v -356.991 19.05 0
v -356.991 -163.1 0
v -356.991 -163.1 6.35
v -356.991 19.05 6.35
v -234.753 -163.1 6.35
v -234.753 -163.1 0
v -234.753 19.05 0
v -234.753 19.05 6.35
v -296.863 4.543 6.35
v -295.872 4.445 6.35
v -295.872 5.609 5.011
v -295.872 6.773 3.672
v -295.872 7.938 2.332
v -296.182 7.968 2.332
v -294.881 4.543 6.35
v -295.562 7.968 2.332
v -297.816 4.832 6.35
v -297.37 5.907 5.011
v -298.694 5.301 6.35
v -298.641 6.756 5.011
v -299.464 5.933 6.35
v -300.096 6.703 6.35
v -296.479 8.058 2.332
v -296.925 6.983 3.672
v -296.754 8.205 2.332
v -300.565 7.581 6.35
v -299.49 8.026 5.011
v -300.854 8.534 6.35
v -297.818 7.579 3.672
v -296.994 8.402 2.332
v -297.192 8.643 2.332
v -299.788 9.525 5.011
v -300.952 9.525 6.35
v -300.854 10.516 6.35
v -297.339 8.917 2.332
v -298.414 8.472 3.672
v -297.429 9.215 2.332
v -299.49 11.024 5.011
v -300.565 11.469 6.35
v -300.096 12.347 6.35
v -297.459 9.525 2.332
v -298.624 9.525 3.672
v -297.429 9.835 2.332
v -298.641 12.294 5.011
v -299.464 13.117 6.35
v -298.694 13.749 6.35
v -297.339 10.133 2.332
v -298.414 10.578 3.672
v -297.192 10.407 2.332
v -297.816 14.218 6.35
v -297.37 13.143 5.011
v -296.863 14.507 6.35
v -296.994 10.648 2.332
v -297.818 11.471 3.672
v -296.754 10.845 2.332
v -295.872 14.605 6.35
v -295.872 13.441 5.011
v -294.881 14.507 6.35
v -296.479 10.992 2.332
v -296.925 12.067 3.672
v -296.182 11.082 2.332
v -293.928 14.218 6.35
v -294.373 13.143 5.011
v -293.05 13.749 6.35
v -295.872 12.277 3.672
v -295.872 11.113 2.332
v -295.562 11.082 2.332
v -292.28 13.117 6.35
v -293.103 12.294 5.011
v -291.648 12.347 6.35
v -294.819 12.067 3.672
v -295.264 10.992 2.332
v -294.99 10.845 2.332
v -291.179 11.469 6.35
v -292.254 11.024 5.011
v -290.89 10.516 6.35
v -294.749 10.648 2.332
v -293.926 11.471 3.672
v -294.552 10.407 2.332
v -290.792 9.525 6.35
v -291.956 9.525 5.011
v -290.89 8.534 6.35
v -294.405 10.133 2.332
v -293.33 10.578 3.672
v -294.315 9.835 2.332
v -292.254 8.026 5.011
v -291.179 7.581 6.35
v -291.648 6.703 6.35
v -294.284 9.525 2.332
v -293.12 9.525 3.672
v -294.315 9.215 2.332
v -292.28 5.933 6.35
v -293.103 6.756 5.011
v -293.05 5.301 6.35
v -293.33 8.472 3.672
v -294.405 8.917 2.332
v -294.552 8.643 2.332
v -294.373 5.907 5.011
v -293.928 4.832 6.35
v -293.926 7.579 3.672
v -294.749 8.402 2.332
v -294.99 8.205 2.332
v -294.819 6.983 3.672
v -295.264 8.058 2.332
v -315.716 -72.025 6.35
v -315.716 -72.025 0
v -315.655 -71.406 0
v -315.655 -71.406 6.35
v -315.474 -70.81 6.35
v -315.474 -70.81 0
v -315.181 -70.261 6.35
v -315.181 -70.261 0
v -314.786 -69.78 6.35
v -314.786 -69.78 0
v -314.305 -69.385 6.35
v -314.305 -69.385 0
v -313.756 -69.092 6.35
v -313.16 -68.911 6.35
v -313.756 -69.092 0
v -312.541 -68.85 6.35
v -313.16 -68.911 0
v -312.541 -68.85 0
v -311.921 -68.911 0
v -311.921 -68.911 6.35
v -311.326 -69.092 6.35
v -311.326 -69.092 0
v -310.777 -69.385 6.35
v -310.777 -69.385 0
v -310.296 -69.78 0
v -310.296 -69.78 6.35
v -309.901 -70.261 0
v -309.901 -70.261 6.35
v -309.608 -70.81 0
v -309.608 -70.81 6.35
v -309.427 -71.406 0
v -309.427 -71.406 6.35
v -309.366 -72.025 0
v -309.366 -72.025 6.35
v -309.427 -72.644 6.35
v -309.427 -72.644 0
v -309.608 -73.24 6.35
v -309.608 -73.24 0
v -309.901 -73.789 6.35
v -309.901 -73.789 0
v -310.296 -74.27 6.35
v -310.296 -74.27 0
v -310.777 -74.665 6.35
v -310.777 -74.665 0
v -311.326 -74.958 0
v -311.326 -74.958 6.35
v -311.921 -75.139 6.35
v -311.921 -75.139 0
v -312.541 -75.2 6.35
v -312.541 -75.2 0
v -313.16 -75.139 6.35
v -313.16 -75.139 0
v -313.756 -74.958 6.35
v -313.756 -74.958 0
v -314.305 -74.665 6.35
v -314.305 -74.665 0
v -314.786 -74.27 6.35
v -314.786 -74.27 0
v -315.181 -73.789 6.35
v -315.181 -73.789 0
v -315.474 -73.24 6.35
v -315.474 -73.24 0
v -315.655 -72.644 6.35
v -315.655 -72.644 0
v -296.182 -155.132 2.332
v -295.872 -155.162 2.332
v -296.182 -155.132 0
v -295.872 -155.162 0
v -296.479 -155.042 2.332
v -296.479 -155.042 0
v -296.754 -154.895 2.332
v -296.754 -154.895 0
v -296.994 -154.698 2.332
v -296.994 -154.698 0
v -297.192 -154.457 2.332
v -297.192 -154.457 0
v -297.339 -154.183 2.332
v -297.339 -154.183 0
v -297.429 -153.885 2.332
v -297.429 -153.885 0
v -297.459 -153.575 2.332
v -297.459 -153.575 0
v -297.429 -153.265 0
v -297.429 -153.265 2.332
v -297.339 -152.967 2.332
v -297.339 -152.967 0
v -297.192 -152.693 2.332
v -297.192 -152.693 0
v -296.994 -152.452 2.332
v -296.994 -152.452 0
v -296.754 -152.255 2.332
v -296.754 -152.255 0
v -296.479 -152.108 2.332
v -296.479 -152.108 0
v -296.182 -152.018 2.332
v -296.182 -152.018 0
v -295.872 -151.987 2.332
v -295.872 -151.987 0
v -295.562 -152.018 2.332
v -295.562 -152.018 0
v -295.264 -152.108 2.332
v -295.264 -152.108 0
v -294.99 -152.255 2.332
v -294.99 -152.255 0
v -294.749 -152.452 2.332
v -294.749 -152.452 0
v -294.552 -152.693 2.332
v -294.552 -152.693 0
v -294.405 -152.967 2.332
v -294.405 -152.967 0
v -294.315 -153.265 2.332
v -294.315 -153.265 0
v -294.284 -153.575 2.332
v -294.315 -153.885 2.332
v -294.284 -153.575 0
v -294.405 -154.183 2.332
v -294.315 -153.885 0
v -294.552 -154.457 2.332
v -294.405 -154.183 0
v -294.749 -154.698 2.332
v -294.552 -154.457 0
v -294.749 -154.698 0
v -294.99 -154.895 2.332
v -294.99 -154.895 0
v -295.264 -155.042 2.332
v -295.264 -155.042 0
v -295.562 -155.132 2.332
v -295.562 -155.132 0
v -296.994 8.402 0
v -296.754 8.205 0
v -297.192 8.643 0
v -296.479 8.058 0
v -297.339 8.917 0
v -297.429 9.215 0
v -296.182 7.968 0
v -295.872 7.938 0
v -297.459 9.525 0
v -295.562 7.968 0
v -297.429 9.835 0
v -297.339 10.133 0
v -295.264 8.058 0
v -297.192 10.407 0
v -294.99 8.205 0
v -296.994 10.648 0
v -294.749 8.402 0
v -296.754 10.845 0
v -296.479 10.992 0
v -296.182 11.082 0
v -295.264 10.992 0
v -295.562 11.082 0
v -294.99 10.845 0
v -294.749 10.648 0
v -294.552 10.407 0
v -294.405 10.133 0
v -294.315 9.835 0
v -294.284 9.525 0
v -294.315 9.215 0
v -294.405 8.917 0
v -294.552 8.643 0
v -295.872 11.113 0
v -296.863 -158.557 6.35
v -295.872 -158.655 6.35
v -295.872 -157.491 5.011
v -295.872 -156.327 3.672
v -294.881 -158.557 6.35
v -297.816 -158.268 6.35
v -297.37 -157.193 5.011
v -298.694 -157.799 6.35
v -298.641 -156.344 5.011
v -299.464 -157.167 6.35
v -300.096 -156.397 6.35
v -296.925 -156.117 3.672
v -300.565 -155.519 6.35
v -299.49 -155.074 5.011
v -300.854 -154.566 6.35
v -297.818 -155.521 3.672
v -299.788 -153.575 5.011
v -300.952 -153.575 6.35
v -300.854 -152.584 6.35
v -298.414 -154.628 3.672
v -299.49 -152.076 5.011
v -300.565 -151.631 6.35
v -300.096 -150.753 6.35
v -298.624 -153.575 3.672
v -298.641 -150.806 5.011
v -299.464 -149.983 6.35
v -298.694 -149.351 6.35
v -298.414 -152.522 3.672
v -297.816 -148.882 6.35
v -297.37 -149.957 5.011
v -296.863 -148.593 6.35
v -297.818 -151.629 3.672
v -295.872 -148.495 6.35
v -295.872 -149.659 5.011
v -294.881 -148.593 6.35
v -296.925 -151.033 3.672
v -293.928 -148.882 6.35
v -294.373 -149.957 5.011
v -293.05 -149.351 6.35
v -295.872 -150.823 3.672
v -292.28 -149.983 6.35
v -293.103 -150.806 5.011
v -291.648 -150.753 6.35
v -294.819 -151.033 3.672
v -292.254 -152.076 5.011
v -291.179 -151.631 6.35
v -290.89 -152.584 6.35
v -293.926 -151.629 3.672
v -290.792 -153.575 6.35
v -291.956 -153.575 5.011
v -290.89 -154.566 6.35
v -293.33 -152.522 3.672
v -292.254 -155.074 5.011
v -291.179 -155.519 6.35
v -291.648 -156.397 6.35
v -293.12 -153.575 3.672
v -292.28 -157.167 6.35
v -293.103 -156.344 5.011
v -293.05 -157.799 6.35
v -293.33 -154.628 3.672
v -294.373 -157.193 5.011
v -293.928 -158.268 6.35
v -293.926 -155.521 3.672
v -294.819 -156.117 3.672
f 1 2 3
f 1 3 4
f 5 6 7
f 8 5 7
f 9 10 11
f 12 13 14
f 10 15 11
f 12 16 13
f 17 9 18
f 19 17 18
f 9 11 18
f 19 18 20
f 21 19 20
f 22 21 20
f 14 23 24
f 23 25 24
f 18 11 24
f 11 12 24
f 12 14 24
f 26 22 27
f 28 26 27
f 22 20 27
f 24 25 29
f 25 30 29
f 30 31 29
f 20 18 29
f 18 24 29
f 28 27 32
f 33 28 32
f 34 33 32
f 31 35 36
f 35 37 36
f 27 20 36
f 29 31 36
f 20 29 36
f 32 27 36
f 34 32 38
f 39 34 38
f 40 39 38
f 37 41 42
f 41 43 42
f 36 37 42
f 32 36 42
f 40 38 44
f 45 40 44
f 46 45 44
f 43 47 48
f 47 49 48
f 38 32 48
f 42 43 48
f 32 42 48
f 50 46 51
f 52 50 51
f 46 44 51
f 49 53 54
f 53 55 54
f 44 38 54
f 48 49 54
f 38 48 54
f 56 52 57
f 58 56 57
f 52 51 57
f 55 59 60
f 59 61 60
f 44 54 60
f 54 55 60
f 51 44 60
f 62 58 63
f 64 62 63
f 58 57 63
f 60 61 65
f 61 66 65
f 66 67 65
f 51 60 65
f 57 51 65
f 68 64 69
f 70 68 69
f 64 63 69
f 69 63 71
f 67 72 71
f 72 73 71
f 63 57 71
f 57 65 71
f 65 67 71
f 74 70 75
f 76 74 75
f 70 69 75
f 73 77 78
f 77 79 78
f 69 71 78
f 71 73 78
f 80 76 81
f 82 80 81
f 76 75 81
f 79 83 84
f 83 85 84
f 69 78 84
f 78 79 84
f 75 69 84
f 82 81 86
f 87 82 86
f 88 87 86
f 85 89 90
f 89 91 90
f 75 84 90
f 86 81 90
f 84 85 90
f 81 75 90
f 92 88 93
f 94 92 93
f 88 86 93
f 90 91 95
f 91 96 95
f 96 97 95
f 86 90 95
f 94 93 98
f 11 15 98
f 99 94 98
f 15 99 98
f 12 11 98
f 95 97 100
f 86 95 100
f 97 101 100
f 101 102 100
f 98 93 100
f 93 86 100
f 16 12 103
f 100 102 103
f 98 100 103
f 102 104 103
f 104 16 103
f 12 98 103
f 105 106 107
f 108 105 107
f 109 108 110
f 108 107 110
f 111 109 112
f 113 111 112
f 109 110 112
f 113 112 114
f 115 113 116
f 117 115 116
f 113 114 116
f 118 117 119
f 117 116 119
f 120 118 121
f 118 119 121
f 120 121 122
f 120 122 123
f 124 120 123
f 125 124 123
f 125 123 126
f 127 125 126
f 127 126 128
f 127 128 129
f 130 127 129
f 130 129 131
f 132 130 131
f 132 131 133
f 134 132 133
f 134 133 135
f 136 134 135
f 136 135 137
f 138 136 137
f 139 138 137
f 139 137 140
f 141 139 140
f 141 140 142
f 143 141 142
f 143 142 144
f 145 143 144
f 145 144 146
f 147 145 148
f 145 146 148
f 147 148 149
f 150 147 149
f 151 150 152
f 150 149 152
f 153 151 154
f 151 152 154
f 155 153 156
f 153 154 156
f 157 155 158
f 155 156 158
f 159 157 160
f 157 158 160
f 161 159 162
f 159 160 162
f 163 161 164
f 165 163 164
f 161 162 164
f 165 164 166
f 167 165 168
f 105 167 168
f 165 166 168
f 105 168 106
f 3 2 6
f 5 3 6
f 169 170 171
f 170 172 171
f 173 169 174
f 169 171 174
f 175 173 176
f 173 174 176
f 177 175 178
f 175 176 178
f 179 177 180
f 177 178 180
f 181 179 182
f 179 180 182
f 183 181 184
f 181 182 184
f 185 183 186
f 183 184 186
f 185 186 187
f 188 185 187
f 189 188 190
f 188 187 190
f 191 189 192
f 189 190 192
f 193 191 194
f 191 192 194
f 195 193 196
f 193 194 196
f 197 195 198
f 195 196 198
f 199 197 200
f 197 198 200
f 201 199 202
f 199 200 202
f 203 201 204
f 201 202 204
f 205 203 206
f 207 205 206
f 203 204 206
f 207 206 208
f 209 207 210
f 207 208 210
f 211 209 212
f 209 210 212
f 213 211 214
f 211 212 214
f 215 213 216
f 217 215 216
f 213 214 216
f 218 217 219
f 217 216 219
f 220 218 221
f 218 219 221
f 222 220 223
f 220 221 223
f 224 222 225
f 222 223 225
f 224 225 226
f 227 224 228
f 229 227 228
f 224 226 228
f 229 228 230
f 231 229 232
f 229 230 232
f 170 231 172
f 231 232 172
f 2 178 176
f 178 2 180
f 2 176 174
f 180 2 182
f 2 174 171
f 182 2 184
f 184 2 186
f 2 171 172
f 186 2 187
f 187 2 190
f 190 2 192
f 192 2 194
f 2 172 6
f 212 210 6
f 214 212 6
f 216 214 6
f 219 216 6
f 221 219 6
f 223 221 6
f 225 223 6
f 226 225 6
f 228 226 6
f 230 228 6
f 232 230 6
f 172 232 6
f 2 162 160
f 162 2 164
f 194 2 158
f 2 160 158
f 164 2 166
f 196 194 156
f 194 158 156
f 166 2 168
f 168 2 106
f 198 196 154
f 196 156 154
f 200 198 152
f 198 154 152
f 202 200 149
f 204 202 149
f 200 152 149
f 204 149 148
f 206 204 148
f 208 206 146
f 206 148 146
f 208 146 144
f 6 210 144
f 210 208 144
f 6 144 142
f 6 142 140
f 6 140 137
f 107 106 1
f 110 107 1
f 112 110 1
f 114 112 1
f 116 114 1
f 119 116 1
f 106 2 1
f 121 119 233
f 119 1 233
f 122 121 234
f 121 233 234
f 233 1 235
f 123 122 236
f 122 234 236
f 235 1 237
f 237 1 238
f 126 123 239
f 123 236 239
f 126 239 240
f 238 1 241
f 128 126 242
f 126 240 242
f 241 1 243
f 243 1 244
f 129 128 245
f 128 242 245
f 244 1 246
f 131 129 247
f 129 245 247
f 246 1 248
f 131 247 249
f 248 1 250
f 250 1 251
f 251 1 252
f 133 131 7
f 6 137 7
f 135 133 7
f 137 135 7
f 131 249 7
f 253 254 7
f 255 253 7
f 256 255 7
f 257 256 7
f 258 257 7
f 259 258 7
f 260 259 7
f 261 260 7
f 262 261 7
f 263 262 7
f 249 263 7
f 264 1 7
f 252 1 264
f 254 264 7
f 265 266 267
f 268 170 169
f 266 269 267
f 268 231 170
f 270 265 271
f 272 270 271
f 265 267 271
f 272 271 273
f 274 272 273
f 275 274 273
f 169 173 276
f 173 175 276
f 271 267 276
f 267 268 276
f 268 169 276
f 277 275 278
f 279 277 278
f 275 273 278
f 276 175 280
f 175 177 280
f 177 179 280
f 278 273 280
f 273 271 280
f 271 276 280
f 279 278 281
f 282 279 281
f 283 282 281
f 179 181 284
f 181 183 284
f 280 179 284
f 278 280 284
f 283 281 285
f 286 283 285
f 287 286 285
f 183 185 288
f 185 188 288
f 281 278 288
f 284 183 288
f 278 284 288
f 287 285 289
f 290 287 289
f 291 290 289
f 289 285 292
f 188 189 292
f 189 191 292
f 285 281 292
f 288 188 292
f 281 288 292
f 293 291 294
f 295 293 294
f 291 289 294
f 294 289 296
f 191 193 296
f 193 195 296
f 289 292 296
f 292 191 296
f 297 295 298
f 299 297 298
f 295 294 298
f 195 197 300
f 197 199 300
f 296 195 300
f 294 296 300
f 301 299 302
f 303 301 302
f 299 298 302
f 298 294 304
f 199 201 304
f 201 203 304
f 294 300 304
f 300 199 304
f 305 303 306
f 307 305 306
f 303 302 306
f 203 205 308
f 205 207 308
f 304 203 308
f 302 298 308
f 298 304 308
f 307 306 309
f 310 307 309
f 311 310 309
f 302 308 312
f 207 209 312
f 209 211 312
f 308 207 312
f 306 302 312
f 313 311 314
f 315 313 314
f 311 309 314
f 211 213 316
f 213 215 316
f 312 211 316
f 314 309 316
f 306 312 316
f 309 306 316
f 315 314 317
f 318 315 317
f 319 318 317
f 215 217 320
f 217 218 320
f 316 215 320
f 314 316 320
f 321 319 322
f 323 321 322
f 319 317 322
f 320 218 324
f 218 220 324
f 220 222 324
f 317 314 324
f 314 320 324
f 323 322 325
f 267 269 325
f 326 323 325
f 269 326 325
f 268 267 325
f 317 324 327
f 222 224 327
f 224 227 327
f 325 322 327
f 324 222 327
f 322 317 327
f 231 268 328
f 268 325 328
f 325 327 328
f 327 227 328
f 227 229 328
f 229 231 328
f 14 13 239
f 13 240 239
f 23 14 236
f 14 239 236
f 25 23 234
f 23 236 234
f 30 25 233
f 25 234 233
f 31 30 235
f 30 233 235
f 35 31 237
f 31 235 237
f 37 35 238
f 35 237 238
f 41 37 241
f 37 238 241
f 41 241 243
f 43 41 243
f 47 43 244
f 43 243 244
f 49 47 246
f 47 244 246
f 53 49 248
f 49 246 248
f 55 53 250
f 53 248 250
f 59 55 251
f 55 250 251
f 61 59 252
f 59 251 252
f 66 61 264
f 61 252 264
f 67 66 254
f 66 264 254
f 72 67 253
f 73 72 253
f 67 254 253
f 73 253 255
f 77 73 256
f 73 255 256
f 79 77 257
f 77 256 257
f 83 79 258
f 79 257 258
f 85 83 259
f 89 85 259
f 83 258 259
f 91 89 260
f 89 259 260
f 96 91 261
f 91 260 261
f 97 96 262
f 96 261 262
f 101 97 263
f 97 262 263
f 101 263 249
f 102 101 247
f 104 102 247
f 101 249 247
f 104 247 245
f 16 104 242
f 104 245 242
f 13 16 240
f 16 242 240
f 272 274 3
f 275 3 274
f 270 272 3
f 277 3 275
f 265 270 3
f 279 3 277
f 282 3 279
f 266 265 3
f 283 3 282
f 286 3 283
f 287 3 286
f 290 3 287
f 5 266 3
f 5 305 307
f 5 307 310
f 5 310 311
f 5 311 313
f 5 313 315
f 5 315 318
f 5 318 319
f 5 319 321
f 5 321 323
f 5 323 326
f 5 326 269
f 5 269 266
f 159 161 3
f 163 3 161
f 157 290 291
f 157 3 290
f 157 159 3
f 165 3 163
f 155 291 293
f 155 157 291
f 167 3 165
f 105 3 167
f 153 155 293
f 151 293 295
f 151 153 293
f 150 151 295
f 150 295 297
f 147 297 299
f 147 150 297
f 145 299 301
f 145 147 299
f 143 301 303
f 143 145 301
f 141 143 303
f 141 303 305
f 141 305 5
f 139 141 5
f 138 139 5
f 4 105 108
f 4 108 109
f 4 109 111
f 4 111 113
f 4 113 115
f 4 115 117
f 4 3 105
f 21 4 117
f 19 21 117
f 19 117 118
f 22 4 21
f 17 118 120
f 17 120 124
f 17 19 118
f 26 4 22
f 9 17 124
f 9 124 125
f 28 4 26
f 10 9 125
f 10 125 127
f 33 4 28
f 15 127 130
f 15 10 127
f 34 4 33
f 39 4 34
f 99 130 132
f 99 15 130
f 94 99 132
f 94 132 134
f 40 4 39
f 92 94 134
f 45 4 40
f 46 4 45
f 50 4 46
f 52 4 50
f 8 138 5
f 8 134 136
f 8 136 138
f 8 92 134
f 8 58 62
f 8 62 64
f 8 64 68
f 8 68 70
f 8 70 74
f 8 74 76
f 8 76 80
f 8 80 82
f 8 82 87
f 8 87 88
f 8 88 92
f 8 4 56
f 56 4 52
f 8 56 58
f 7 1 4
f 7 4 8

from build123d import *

# Parameters (mm, degrees)
SKETCH1_W                   = 122.237862113
SKETCH1_H                   = 182.149999994
BOSS_EXTRUDE1_DEPTH         = 6.35
F_1_4_0_25_DIAMETER_HOLE1_D = 6.35
HOLE1_D                     = 3.175
HOLE1_DEPTH                 = 31.75
HOLE1_CSINK_D               = 10.16
HOLE1_CSINK_ANGLE           = 82
HOLE1_TIP                   = 0.953866233


with BuildPart() as part:
    # Sketch1 → Boss-Extrude1 (new body)
    with BuildSketch(Plane.XY):
        with Locations((-295.871898238, -72.024999997)):
            Rectangle(SKETCH1_W, SKETCH1_H)
    extrude(amount=BOSS_EXTRUDE1_DEPTH)

    # 1/4 (0.25) Diameter Hole1 (through all)
    with Locations(Plane.XY.offset(6.35)):
        with Locations((-312.540829294, -72.024999997)):
            Hole(F_1_4_0_25_DIAMETER_HOLE1_D / 2)

    # Hole1
    with Locations(Plane(origin=(181.039434513, -72.024999997, 6.35), x_dir=(0, 1, 0), z_dir=(0, 0, 1))):
        with Locations((81.549999997, 476.911332751), (-81.549999997, 476.911332751)):
            CounterSinkHole(HOLE1_D / 2, HOLE1_CSINK_D / 2, depth=HOLE1_DEPTH, counter_sink_angle=HOLE1_CSINK_ANGLE)
            with Locations((0, 0, -(HOLE1_DEPTH + HOLE1_TIP / 2))):  # 118° drill point
                Cone(0, HOLE1_D / 2, HOLE1_TIP, mode=Mode.SUBTRACT)


solid = part.part
